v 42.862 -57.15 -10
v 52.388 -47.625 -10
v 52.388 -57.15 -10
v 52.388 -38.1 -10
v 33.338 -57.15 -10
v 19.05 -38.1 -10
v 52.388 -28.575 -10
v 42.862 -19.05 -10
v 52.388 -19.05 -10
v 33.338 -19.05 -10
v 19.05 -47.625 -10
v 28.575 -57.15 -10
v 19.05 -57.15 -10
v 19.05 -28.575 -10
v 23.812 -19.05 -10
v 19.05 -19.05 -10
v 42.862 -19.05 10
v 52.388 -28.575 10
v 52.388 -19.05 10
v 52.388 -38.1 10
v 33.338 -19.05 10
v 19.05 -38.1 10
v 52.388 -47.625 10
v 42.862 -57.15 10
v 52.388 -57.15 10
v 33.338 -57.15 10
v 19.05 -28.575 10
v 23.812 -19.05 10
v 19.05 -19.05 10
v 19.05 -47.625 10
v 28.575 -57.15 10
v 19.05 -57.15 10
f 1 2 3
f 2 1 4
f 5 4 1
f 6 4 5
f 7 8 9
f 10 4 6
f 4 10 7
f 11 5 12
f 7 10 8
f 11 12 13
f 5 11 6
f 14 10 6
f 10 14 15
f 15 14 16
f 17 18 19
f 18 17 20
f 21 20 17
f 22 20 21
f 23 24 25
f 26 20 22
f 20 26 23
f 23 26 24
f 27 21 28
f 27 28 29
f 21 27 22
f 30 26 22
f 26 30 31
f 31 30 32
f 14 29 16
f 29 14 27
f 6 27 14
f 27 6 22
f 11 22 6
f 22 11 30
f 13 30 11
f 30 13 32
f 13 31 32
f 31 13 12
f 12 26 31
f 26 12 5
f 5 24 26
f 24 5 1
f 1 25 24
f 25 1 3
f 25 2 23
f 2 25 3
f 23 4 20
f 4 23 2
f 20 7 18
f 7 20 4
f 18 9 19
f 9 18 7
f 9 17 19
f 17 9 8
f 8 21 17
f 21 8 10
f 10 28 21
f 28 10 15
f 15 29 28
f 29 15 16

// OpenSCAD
polyhedron(
    points=[
    [19.05, -19.05, -10],
    [19.05, -28.575, -10],
    [19.05, -38.1, -10],
    [19.05, -47.625, -10],
    [19.05, -57.15, -10],
    [28.575, -57.15, -10],
    [33.3375, -57.15, -10],
    [42.8625, -57.15, -10],
    [52.3875, -57.15, -10],
    [52.3875, -47.625, -10],
    [52.3875, -38.1, -10],
    [52.3875, -28.575, -10],
    [52.3875, -19.05, -10],
    [42.8625, -19.05, -10],
    [33.3375, -19.05, -10],
    [23.8125, -19.05, -10],
    [19.05, -19.05, 10],
    [19.05, -28.575, 10],
    [19.05, -38.1, 10],
    [19.05, -47.625, 10],
    [19.05, -57.15, 10],
    [28.575, -57.15, 10],
    [33.3375, -57.15, 10],
    [42.8625, -57.15, 10],
    [52.3875, -57.15, 10],
    [52.3875, -47.625, 10],
    [52.3875, -38.1, 10],
    [52.3875, -28.575, 10],
    [52.3875, -19.05, 10],
    [42.8625, -19.05, 10],
    [33.3375, -19.05, 10],
    [23.8125, -19.05, 10],
    ],
    faces=[
        [0,1,2,3,4,5,6,7,8,9,10,11,12,13,14,15],
        [31,30,29,28,27,26,25,24,23,22,21,20,19,18,17,16],
        [0,16,17,1],
        [1,17,18,2],
        [2,18,19,3],
        [3,19,20,4],
        [4,20,21,5],
        [5,21,22,6],
        [6,22,23,7],
        [7,23,24,8],
        [8,24,25,9],
        [9,25,26,10],
        [10,26,27,11],
        [11,27,28,12],
        [12,28,29,13],
        [13,29,30,14],
        [14,30,31,15],
        [15,31,16,0],
    ]
);
